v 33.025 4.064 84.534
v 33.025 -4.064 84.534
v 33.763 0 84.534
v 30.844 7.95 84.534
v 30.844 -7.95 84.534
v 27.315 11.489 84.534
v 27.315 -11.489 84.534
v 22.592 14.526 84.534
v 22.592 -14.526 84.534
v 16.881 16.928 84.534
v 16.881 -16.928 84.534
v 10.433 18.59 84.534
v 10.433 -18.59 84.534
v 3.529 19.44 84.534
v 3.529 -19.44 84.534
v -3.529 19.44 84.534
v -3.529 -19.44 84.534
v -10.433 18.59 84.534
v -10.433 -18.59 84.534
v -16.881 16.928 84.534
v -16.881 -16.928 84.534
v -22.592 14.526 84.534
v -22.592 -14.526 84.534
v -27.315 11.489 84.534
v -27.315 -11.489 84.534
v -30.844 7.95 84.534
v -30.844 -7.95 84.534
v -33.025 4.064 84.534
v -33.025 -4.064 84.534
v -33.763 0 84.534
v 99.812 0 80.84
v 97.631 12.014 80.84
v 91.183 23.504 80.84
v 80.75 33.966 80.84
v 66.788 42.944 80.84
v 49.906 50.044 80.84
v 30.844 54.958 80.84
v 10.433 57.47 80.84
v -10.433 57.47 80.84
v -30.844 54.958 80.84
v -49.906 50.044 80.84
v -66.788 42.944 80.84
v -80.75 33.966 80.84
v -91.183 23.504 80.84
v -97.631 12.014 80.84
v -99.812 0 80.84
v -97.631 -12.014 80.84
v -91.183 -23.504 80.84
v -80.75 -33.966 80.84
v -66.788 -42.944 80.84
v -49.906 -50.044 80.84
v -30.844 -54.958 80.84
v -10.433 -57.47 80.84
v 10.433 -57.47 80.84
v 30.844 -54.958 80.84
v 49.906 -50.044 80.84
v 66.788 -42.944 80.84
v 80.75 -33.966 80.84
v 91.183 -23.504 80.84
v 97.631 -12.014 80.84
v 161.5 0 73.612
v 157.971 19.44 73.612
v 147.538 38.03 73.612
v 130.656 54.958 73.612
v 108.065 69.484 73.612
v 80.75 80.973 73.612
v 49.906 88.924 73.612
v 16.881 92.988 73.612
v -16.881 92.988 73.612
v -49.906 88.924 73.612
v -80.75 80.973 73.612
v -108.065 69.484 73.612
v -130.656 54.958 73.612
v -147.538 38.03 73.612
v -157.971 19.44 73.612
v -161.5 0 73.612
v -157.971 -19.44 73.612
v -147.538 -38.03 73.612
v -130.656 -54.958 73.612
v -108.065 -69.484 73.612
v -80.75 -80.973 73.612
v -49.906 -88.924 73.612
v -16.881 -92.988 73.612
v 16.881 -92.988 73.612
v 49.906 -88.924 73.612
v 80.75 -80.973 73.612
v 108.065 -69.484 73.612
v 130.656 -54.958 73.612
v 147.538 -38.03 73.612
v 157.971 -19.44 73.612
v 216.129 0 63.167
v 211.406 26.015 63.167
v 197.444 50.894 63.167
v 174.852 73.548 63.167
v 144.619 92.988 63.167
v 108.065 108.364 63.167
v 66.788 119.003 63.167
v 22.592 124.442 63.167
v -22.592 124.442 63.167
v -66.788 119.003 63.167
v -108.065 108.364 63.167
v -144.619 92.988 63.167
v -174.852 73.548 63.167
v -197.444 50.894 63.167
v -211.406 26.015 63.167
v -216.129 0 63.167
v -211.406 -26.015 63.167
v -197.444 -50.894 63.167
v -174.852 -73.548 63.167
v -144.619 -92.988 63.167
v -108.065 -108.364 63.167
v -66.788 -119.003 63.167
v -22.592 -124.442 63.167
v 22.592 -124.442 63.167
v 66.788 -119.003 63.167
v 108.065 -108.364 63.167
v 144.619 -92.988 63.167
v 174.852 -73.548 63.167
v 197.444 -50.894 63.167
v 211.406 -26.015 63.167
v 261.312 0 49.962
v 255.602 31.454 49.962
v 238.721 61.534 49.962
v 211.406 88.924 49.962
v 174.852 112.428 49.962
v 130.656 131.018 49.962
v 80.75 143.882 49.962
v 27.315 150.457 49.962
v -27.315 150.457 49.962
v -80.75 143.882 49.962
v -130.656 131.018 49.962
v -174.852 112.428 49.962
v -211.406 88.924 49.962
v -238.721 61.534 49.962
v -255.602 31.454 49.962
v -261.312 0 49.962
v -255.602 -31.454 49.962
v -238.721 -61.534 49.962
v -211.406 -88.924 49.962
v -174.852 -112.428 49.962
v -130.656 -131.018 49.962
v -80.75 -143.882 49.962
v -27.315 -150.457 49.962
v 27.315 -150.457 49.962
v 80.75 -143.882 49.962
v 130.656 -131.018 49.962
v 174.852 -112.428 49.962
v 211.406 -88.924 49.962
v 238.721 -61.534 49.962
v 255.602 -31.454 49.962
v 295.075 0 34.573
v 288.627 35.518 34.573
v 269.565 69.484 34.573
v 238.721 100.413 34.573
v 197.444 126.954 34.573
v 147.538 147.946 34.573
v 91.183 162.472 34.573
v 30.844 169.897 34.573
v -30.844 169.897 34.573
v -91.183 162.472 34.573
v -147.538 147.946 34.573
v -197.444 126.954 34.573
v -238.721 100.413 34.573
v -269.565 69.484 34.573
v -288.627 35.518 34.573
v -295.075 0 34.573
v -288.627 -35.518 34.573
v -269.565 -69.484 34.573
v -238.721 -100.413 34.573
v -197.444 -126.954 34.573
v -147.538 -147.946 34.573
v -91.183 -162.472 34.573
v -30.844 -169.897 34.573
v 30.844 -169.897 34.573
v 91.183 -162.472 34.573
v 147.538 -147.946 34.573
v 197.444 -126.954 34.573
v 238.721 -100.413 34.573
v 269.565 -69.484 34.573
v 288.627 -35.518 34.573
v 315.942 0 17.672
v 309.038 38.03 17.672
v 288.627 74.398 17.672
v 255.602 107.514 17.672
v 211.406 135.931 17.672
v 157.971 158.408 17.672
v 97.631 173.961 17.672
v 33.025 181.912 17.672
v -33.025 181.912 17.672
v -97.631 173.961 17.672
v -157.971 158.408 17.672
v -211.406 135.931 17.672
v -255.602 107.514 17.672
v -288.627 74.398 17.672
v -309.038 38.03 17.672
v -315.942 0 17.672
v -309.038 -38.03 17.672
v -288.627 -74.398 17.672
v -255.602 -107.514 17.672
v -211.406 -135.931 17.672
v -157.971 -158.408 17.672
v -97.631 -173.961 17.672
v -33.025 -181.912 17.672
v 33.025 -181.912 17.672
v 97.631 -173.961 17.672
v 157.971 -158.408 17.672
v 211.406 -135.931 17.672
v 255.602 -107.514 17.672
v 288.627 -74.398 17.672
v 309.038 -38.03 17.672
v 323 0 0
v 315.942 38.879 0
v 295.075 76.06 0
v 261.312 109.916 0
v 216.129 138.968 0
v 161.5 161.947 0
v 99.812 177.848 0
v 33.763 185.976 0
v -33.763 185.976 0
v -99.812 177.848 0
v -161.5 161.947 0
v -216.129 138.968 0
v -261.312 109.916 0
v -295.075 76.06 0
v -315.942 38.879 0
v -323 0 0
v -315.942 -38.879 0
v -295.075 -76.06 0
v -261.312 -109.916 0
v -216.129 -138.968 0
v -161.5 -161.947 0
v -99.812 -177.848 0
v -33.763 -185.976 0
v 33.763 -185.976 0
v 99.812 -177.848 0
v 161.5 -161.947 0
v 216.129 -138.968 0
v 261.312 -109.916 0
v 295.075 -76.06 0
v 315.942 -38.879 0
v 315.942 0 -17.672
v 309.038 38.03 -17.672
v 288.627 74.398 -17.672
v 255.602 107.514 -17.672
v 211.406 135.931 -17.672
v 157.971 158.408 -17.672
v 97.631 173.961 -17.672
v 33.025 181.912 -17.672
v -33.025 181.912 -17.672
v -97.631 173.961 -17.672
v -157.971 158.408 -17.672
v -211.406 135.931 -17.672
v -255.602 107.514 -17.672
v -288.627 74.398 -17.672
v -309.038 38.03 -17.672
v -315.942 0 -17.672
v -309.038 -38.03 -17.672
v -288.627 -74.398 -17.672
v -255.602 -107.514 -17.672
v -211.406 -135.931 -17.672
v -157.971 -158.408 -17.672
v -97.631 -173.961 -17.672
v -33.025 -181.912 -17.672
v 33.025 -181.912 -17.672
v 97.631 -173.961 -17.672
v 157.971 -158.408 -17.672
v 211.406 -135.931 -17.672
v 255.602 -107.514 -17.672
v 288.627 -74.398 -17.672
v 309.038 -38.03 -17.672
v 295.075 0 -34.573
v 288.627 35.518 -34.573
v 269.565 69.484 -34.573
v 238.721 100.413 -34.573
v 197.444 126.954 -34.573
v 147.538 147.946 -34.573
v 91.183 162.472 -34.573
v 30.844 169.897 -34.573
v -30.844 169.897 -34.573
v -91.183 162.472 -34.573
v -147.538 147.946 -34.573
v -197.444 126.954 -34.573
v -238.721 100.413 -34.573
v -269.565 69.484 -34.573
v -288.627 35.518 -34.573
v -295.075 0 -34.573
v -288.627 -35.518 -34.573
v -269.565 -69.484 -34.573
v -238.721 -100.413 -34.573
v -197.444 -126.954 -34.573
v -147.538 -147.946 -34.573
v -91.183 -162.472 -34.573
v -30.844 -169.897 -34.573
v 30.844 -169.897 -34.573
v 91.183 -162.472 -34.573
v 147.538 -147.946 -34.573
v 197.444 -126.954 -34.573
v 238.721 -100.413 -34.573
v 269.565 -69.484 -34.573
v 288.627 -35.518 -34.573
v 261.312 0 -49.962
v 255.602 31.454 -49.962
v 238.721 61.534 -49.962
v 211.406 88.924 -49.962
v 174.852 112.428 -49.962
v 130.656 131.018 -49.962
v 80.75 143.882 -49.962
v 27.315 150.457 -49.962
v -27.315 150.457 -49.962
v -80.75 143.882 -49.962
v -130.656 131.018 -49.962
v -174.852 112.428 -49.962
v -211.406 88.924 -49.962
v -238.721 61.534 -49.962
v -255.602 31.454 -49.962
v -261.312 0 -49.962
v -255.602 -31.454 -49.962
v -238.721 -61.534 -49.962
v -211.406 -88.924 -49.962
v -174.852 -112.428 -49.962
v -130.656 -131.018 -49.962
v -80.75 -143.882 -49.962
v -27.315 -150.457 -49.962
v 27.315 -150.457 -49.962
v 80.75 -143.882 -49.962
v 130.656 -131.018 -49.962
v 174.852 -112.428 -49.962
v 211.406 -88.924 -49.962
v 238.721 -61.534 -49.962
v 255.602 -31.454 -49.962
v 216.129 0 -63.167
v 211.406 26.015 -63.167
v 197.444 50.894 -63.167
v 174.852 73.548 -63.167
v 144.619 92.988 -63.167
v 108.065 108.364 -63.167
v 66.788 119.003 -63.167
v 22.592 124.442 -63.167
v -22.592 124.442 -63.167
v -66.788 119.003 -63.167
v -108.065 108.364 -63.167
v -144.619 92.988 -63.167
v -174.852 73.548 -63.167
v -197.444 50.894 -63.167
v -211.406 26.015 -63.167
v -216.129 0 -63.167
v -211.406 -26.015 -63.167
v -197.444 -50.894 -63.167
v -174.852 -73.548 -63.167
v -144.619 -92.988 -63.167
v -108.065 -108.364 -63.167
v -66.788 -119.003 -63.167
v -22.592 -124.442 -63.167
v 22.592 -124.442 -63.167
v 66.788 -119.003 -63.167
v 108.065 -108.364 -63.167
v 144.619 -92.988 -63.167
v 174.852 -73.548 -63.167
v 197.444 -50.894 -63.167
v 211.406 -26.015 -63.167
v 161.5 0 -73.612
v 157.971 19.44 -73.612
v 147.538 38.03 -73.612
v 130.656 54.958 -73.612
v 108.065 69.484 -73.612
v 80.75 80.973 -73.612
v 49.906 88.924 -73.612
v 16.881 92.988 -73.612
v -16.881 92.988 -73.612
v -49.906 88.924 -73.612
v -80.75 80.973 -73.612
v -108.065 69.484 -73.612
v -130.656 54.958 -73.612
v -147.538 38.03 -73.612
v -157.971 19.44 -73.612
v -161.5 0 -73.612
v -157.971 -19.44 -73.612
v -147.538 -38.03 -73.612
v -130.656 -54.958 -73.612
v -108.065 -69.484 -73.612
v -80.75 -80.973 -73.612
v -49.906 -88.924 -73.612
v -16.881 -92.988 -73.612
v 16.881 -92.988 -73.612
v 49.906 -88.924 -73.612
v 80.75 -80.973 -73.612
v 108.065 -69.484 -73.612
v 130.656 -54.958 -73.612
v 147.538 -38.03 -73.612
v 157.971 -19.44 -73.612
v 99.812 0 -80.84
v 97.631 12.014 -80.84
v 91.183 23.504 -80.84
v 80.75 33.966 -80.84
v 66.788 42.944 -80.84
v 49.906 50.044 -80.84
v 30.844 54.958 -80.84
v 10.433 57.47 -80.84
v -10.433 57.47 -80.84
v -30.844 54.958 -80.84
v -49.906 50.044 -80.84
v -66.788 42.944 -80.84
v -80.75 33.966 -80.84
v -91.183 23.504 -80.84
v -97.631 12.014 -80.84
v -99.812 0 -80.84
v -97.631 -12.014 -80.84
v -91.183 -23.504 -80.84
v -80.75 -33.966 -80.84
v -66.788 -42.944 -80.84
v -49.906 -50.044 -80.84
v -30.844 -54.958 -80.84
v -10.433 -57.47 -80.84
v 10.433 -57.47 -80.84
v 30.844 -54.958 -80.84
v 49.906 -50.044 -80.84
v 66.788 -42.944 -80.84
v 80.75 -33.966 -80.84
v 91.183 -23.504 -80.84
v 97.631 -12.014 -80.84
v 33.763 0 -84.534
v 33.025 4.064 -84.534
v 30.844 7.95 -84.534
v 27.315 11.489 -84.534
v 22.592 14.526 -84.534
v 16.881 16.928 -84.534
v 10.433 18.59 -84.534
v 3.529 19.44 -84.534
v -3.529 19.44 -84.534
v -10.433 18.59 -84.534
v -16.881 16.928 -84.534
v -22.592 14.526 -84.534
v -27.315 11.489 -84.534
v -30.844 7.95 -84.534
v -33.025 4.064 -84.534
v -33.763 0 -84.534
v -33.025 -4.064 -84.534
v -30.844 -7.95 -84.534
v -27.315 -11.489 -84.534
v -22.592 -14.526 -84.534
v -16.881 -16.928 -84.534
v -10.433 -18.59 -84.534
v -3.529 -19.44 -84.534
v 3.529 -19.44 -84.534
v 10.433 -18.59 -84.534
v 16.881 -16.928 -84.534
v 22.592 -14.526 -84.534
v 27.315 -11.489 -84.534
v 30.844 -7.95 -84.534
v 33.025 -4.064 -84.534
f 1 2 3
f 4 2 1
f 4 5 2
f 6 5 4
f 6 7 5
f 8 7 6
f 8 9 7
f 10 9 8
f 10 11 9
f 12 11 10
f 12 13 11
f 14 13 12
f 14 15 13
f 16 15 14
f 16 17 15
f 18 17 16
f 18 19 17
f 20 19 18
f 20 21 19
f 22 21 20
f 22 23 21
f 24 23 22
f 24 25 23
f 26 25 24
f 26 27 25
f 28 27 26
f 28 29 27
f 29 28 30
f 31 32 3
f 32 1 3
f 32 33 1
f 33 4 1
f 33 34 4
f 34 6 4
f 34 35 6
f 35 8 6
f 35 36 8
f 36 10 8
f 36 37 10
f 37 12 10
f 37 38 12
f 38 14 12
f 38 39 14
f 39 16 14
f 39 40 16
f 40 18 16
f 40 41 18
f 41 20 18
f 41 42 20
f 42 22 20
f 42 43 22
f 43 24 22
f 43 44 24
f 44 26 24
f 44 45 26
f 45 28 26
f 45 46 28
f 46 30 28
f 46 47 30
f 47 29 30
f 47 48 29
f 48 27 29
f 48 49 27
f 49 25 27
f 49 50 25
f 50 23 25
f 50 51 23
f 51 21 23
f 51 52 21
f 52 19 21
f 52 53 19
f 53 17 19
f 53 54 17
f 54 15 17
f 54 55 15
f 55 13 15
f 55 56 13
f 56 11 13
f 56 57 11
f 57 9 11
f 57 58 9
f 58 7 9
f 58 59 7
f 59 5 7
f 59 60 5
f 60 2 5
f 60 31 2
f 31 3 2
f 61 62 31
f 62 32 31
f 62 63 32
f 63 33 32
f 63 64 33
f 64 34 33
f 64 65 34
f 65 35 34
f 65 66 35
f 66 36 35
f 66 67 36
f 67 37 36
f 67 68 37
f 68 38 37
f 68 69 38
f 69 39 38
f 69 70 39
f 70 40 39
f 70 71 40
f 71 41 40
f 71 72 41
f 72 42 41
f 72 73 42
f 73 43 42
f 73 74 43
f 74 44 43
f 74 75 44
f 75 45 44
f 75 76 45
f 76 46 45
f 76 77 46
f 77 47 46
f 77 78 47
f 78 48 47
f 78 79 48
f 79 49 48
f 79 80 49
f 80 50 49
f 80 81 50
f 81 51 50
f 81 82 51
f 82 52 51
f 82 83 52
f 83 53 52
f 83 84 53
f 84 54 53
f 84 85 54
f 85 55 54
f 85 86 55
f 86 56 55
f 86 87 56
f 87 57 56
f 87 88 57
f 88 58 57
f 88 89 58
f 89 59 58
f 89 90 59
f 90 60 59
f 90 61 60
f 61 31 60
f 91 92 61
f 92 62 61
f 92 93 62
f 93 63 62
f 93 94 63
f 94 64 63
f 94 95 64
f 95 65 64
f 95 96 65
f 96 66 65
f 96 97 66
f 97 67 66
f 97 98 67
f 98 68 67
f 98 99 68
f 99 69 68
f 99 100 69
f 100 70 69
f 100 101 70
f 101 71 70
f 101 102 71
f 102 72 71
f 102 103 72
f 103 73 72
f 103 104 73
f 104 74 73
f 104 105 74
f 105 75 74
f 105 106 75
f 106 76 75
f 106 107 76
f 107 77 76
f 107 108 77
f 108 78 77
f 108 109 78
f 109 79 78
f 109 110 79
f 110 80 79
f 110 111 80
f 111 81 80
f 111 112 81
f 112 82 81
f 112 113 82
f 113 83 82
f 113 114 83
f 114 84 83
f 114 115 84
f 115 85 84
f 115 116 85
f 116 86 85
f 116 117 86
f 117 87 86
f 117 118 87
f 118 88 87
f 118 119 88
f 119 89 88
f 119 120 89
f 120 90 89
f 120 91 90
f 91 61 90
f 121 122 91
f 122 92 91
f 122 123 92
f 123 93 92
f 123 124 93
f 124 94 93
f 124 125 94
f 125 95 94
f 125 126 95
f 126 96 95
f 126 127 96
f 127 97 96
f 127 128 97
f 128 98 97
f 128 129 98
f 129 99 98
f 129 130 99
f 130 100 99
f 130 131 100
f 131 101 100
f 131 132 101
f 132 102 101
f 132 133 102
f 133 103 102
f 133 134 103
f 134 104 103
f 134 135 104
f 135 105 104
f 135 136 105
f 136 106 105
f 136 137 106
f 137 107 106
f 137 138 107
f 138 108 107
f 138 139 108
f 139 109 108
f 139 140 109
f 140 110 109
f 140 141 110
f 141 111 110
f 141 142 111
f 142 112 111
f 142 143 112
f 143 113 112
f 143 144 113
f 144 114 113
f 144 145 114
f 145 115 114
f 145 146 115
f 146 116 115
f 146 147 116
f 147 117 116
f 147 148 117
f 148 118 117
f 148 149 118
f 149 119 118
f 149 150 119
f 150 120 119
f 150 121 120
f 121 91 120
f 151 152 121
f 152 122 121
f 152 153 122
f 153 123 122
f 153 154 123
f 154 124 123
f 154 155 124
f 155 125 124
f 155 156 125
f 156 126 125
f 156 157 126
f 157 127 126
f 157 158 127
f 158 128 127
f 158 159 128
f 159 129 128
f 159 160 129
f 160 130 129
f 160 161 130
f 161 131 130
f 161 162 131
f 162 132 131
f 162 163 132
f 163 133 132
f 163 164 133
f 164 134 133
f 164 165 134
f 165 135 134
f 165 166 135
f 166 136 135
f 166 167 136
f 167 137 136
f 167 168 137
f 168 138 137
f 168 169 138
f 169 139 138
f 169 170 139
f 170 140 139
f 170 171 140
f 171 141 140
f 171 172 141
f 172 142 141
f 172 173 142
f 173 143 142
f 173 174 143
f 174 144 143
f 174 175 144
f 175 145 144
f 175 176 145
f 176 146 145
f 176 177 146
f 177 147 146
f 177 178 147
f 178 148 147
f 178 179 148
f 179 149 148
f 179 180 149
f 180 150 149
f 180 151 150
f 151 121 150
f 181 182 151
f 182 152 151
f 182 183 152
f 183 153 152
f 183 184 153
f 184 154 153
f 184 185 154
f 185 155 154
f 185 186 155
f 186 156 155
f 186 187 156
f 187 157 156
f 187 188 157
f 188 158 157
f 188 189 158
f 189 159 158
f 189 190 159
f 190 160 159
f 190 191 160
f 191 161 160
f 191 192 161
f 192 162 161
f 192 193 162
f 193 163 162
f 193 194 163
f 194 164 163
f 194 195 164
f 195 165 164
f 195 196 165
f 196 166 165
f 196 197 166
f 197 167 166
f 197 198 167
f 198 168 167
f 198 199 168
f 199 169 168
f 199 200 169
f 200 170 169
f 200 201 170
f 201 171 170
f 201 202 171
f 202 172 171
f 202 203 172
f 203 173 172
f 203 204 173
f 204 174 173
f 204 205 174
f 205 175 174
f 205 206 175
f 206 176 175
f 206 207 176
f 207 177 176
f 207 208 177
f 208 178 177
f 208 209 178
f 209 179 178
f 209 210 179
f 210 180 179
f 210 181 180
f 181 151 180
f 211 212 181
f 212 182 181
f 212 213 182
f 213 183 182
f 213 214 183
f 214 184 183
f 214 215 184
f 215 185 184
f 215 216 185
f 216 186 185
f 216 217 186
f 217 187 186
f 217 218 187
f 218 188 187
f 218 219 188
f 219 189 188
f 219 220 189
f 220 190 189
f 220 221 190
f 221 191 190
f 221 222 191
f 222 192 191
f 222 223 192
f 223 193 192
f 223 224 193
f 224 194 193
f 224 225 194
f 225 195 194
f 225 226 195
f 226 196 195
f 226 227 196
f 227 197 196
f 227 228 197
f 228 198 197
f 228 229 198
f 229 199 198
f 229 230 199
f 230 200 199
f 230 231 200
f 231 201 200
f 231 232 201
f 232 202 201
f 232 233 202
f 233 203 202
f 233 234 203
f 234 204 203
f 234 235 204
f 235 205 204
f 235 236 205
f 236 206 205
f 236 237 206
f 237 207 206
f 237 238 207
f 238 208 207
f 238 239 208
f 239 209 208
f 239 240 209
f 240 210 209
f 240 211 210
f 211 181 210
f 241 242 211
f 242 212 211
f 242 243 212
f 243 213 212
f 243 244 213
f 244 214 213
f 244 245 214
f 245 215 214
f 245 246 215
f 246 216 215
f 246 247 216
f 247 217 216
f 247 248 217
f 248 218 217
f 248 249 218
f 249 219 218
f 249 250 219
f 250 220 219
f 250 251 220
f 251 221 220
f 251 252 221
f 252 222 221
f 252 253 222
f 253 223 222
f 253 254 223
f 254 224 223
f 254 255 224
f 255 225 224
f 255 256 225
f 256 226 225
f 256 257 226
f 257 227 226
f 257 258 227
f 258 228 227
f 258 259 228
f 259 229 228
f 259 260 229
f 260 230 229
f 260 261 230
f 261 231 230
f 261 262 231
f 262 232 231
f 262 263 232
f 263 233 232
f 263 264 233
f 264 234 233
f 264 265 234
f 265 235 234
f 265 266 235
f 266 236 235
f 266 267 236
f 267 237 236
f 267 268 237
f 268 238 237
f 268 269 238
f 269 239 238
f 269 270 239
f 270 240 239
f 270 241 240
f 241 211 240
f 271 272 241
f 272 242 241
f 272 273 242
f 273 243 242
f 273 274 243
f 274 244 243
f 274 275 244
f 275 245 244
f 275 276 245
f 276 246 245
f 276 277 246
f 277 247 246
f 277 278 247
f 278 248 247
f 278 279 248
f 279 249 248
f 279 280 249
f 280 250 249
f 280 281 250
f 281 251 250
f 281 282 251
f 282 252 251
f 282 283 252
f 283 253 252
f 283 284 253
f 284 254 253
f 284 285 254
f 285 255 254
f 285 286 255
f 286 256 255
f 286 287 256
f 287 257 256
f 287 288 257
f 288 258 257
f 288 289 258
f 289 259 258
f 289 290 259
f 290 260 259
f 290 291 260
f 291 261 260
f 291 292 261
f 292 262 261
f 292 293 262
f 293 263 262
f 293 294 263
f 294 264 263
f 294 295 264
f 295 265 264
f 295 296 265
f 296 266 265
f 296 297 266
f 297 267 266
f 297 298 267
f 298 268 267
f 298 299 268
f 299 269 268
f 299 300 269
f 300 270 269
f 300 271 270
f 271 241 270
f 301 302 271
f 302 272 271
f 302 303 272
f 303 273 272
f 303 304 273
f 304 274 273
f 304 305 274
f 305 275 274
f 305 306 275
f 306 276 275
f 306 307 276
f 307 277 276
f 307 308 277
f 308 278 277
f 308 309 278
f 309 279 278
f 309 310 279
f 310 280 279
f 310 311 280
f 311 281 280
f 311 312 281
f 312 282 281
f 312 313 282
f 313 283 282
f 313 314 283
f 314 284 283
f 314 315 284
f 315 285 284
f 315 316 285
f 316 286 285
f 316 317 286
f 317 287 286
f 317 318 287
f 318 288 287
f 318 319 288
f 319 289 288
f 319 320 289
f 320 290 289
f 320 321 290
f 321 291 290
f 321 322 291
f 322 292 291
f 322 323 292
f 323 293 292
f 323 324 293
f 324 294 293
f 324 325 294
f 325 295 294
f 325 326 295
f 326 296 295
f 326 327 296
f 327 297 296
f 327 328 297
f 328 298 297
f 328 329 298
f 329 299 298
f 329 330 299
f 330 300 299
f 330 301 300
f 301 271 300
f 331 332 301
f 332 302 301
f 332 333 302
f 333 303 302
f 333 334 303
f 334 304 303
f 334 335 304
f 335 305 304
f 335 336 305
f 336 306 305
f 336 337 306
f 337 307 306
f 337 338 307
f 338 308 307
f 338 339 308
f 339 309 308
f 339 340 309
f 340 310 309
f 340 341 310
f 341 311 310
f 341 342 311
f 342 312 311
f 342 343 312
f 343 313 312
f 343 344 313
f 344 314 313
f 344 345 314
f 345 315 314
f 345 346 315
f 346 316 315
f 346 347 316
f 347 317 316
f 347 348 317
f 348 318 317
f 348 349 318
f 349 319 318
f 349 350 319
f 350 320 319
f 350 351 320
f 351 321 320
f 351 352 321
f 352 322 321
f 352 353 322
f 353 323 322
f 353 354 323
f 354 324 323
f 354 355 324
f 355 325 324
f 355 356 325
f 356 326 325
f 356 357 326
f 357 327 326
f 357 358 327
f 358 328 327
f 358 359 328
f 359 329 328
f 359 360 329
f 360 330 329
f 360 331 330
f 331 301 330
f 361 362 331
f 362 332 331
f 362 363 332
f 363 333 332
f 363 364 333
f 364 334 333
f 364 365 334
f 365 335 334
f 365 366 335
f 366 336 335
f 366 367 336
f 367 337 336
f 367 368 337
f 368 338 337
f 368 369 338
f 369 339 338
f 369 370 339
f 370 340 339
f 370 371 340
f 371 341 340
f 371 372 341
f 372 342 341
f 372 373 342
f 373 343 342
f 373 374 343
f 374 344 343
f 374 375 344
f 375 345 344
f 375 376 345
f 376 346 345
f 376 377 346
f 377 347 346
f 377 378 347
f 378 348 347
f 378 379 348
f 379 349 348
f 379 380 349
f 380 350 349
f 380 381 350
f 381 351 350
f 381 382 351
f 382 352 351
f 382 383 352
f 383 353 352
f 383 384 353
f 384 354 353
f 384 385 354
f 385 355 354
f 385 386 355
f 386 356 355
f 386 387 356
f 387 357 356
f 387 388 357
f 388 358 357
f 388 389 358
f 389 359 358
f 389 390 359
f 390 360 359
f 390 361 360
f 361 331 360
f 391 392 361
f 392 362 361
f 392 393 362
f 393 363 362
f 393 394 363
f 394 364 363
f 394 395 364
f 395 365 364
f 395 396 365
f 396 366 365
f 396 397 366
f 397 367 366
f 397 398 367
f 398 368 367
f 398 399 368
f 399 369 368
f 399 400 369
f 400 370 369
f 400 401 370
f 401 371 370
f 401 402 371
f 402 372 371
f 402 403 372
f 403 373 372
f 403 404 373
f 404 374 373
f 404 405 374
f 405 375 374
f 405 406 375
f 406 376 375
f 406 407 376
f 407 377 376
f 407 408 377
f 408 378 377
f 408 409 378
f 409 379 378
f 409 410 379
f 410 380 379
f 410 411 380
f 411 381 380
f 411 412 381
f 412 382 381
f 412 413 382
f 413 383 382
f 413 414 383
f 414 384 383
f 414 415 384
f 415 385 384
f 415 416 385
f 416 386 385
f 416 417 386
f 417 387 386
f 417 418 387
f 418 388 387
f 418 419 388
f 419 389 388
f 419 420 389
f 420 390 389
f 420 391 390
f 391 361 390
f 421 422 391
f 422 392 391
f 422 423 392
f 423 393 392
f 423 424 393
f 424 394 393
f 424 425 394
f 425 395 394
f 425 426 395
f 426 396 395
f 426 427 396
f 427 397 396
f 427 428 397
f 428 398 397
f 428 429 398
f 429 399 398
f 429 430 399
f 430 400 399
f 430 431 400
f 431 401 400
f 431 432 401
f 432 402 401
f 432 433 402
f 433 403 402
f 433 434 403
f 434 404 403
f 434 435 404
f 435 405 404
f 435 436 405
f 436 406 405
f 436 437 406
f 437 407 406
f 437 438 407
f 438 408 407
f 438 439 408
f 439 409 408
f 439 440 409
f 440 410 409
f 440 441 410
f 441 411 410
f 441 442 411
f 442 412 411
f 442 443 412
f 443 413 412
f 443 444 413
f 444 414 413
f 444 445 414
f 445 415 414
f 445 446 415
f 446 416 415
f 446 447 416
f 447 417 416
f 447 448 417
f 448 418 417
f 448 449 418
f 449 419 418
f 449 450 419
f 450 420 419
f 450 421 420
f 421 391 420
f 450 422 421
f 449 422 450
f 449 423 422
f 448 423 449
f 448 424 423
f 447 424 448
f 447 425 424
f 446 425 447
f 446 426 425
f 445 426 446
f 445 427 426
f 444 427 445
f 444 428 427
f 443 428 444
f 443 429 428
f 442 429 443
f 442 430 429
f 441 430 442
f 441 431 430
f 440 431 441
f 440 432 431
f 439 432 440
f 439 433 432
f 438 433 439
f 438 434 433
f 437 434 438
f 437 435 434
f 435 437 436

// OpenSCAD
// Generated by SolidPython 1.0.1 on 2020-07-29 00:46:54


scale(v = [19, 11, 5]) {
	sphere(r = 17);
}
/***********************************************
*********      SolidPython code:      **********
************************************************
 
# import packages: SolidPython
from solid import *
from solid.utils import *
from itertools import chain, combinations, permutations


class Resize:

    def __init__(self, scad_file):
        self.scad_file = scad_file
        #self.scad_file = import_scad(scad_file)
        # cone/cylinder param:
        self.r1 = 0
        self.r2 = 0
        self.h = 0
        # rectangular prism param:
        self.w = 0
        self.l = 0
        # ellipse param:
        self.r = 0

    # import OpenScad code (file name corresponds to shape)


    # classify shape + parameters
    def assign(self, param1, param2, param3):
        if self.scad_file == 'cone.scad':
            self.r1 = param1
            self.r2 = param2
            self.h = param3
        elif self.scad_file == 'cylinder.scad':
            self.r1 = param1
            self.r2 = param2
            self.h = param3
        elif self.scad_file == 'rectangularPrism.scad':
            self.h = param1
            self.l = param2
            self.w = param3
        else:
            self.r = param1
            self.h = param2

    # resize parameters
    def iterate(self):
        x = range(3, 20, 2)
        i = 1
        if self.scad_file == 'cone.scad':
            tempList = list(permutations(x, 2))
            for temp in tempList:
                param1 = temp[0]
                param2 = temp[1]
                filepath = 'produced_scad_files/' + 'cone' + str(param1) + '_' + str(param2) + '_' + '.scad'
                scad_render_to_file(cylinder(h=param1, r1=param2, r2=0), filepath)

        elif self.scad_file == 'cylinder.scad':
            tempList = list(permutations(x, 3))
            for temp in tempList:
                param1 = temp[0]
                param2 = temp[1]
                filepath = 'produced_scad_files/' + 'cylinder' + str(param1) + '_' + str(param2) + '_' + '.scad'
                scad_render_to_file(cylinder(h=param1, r1=param2, r2=param2), filepath)

        elif self.scad_file == 'rectangularPrism.scad':
            tempList = list(permutations(x, 3))
            for temp in tempList:
                param1 = temp[0]
                param2 = temp[1]
                param3 = temp[2]
                filepath = 'produced_scad_files/' + 'rectangularPrism' + str(param1) + '_' + str(param2) + '_' + str(
                    param3) + '.scad'
                scad_render_to_file(cube(size=(param1, param2, param3)), filepath)

        elif self.scad_file == 'ellipse.scad':
            tempList = list(permutations(x, 4))
            for temp in tempList:
                param1 = temp[0]
                param2 = temp[1]
                param3 = temp[2]
                param4 = temp[3]
                filepath = 'produced_scad_files/' + 'ellipse' + str(param1) + '_' + str(param2) + '_' + str(param3) + '_' + str(param4) + '.scad'
                scad_render_to_file(scale([param1, param2, param3])(sphere(r=param4)), filepath)

    def render_to_scadfile(self):
        scad_render_to_file(scad, 'example.scad') 
 
************************************************/
